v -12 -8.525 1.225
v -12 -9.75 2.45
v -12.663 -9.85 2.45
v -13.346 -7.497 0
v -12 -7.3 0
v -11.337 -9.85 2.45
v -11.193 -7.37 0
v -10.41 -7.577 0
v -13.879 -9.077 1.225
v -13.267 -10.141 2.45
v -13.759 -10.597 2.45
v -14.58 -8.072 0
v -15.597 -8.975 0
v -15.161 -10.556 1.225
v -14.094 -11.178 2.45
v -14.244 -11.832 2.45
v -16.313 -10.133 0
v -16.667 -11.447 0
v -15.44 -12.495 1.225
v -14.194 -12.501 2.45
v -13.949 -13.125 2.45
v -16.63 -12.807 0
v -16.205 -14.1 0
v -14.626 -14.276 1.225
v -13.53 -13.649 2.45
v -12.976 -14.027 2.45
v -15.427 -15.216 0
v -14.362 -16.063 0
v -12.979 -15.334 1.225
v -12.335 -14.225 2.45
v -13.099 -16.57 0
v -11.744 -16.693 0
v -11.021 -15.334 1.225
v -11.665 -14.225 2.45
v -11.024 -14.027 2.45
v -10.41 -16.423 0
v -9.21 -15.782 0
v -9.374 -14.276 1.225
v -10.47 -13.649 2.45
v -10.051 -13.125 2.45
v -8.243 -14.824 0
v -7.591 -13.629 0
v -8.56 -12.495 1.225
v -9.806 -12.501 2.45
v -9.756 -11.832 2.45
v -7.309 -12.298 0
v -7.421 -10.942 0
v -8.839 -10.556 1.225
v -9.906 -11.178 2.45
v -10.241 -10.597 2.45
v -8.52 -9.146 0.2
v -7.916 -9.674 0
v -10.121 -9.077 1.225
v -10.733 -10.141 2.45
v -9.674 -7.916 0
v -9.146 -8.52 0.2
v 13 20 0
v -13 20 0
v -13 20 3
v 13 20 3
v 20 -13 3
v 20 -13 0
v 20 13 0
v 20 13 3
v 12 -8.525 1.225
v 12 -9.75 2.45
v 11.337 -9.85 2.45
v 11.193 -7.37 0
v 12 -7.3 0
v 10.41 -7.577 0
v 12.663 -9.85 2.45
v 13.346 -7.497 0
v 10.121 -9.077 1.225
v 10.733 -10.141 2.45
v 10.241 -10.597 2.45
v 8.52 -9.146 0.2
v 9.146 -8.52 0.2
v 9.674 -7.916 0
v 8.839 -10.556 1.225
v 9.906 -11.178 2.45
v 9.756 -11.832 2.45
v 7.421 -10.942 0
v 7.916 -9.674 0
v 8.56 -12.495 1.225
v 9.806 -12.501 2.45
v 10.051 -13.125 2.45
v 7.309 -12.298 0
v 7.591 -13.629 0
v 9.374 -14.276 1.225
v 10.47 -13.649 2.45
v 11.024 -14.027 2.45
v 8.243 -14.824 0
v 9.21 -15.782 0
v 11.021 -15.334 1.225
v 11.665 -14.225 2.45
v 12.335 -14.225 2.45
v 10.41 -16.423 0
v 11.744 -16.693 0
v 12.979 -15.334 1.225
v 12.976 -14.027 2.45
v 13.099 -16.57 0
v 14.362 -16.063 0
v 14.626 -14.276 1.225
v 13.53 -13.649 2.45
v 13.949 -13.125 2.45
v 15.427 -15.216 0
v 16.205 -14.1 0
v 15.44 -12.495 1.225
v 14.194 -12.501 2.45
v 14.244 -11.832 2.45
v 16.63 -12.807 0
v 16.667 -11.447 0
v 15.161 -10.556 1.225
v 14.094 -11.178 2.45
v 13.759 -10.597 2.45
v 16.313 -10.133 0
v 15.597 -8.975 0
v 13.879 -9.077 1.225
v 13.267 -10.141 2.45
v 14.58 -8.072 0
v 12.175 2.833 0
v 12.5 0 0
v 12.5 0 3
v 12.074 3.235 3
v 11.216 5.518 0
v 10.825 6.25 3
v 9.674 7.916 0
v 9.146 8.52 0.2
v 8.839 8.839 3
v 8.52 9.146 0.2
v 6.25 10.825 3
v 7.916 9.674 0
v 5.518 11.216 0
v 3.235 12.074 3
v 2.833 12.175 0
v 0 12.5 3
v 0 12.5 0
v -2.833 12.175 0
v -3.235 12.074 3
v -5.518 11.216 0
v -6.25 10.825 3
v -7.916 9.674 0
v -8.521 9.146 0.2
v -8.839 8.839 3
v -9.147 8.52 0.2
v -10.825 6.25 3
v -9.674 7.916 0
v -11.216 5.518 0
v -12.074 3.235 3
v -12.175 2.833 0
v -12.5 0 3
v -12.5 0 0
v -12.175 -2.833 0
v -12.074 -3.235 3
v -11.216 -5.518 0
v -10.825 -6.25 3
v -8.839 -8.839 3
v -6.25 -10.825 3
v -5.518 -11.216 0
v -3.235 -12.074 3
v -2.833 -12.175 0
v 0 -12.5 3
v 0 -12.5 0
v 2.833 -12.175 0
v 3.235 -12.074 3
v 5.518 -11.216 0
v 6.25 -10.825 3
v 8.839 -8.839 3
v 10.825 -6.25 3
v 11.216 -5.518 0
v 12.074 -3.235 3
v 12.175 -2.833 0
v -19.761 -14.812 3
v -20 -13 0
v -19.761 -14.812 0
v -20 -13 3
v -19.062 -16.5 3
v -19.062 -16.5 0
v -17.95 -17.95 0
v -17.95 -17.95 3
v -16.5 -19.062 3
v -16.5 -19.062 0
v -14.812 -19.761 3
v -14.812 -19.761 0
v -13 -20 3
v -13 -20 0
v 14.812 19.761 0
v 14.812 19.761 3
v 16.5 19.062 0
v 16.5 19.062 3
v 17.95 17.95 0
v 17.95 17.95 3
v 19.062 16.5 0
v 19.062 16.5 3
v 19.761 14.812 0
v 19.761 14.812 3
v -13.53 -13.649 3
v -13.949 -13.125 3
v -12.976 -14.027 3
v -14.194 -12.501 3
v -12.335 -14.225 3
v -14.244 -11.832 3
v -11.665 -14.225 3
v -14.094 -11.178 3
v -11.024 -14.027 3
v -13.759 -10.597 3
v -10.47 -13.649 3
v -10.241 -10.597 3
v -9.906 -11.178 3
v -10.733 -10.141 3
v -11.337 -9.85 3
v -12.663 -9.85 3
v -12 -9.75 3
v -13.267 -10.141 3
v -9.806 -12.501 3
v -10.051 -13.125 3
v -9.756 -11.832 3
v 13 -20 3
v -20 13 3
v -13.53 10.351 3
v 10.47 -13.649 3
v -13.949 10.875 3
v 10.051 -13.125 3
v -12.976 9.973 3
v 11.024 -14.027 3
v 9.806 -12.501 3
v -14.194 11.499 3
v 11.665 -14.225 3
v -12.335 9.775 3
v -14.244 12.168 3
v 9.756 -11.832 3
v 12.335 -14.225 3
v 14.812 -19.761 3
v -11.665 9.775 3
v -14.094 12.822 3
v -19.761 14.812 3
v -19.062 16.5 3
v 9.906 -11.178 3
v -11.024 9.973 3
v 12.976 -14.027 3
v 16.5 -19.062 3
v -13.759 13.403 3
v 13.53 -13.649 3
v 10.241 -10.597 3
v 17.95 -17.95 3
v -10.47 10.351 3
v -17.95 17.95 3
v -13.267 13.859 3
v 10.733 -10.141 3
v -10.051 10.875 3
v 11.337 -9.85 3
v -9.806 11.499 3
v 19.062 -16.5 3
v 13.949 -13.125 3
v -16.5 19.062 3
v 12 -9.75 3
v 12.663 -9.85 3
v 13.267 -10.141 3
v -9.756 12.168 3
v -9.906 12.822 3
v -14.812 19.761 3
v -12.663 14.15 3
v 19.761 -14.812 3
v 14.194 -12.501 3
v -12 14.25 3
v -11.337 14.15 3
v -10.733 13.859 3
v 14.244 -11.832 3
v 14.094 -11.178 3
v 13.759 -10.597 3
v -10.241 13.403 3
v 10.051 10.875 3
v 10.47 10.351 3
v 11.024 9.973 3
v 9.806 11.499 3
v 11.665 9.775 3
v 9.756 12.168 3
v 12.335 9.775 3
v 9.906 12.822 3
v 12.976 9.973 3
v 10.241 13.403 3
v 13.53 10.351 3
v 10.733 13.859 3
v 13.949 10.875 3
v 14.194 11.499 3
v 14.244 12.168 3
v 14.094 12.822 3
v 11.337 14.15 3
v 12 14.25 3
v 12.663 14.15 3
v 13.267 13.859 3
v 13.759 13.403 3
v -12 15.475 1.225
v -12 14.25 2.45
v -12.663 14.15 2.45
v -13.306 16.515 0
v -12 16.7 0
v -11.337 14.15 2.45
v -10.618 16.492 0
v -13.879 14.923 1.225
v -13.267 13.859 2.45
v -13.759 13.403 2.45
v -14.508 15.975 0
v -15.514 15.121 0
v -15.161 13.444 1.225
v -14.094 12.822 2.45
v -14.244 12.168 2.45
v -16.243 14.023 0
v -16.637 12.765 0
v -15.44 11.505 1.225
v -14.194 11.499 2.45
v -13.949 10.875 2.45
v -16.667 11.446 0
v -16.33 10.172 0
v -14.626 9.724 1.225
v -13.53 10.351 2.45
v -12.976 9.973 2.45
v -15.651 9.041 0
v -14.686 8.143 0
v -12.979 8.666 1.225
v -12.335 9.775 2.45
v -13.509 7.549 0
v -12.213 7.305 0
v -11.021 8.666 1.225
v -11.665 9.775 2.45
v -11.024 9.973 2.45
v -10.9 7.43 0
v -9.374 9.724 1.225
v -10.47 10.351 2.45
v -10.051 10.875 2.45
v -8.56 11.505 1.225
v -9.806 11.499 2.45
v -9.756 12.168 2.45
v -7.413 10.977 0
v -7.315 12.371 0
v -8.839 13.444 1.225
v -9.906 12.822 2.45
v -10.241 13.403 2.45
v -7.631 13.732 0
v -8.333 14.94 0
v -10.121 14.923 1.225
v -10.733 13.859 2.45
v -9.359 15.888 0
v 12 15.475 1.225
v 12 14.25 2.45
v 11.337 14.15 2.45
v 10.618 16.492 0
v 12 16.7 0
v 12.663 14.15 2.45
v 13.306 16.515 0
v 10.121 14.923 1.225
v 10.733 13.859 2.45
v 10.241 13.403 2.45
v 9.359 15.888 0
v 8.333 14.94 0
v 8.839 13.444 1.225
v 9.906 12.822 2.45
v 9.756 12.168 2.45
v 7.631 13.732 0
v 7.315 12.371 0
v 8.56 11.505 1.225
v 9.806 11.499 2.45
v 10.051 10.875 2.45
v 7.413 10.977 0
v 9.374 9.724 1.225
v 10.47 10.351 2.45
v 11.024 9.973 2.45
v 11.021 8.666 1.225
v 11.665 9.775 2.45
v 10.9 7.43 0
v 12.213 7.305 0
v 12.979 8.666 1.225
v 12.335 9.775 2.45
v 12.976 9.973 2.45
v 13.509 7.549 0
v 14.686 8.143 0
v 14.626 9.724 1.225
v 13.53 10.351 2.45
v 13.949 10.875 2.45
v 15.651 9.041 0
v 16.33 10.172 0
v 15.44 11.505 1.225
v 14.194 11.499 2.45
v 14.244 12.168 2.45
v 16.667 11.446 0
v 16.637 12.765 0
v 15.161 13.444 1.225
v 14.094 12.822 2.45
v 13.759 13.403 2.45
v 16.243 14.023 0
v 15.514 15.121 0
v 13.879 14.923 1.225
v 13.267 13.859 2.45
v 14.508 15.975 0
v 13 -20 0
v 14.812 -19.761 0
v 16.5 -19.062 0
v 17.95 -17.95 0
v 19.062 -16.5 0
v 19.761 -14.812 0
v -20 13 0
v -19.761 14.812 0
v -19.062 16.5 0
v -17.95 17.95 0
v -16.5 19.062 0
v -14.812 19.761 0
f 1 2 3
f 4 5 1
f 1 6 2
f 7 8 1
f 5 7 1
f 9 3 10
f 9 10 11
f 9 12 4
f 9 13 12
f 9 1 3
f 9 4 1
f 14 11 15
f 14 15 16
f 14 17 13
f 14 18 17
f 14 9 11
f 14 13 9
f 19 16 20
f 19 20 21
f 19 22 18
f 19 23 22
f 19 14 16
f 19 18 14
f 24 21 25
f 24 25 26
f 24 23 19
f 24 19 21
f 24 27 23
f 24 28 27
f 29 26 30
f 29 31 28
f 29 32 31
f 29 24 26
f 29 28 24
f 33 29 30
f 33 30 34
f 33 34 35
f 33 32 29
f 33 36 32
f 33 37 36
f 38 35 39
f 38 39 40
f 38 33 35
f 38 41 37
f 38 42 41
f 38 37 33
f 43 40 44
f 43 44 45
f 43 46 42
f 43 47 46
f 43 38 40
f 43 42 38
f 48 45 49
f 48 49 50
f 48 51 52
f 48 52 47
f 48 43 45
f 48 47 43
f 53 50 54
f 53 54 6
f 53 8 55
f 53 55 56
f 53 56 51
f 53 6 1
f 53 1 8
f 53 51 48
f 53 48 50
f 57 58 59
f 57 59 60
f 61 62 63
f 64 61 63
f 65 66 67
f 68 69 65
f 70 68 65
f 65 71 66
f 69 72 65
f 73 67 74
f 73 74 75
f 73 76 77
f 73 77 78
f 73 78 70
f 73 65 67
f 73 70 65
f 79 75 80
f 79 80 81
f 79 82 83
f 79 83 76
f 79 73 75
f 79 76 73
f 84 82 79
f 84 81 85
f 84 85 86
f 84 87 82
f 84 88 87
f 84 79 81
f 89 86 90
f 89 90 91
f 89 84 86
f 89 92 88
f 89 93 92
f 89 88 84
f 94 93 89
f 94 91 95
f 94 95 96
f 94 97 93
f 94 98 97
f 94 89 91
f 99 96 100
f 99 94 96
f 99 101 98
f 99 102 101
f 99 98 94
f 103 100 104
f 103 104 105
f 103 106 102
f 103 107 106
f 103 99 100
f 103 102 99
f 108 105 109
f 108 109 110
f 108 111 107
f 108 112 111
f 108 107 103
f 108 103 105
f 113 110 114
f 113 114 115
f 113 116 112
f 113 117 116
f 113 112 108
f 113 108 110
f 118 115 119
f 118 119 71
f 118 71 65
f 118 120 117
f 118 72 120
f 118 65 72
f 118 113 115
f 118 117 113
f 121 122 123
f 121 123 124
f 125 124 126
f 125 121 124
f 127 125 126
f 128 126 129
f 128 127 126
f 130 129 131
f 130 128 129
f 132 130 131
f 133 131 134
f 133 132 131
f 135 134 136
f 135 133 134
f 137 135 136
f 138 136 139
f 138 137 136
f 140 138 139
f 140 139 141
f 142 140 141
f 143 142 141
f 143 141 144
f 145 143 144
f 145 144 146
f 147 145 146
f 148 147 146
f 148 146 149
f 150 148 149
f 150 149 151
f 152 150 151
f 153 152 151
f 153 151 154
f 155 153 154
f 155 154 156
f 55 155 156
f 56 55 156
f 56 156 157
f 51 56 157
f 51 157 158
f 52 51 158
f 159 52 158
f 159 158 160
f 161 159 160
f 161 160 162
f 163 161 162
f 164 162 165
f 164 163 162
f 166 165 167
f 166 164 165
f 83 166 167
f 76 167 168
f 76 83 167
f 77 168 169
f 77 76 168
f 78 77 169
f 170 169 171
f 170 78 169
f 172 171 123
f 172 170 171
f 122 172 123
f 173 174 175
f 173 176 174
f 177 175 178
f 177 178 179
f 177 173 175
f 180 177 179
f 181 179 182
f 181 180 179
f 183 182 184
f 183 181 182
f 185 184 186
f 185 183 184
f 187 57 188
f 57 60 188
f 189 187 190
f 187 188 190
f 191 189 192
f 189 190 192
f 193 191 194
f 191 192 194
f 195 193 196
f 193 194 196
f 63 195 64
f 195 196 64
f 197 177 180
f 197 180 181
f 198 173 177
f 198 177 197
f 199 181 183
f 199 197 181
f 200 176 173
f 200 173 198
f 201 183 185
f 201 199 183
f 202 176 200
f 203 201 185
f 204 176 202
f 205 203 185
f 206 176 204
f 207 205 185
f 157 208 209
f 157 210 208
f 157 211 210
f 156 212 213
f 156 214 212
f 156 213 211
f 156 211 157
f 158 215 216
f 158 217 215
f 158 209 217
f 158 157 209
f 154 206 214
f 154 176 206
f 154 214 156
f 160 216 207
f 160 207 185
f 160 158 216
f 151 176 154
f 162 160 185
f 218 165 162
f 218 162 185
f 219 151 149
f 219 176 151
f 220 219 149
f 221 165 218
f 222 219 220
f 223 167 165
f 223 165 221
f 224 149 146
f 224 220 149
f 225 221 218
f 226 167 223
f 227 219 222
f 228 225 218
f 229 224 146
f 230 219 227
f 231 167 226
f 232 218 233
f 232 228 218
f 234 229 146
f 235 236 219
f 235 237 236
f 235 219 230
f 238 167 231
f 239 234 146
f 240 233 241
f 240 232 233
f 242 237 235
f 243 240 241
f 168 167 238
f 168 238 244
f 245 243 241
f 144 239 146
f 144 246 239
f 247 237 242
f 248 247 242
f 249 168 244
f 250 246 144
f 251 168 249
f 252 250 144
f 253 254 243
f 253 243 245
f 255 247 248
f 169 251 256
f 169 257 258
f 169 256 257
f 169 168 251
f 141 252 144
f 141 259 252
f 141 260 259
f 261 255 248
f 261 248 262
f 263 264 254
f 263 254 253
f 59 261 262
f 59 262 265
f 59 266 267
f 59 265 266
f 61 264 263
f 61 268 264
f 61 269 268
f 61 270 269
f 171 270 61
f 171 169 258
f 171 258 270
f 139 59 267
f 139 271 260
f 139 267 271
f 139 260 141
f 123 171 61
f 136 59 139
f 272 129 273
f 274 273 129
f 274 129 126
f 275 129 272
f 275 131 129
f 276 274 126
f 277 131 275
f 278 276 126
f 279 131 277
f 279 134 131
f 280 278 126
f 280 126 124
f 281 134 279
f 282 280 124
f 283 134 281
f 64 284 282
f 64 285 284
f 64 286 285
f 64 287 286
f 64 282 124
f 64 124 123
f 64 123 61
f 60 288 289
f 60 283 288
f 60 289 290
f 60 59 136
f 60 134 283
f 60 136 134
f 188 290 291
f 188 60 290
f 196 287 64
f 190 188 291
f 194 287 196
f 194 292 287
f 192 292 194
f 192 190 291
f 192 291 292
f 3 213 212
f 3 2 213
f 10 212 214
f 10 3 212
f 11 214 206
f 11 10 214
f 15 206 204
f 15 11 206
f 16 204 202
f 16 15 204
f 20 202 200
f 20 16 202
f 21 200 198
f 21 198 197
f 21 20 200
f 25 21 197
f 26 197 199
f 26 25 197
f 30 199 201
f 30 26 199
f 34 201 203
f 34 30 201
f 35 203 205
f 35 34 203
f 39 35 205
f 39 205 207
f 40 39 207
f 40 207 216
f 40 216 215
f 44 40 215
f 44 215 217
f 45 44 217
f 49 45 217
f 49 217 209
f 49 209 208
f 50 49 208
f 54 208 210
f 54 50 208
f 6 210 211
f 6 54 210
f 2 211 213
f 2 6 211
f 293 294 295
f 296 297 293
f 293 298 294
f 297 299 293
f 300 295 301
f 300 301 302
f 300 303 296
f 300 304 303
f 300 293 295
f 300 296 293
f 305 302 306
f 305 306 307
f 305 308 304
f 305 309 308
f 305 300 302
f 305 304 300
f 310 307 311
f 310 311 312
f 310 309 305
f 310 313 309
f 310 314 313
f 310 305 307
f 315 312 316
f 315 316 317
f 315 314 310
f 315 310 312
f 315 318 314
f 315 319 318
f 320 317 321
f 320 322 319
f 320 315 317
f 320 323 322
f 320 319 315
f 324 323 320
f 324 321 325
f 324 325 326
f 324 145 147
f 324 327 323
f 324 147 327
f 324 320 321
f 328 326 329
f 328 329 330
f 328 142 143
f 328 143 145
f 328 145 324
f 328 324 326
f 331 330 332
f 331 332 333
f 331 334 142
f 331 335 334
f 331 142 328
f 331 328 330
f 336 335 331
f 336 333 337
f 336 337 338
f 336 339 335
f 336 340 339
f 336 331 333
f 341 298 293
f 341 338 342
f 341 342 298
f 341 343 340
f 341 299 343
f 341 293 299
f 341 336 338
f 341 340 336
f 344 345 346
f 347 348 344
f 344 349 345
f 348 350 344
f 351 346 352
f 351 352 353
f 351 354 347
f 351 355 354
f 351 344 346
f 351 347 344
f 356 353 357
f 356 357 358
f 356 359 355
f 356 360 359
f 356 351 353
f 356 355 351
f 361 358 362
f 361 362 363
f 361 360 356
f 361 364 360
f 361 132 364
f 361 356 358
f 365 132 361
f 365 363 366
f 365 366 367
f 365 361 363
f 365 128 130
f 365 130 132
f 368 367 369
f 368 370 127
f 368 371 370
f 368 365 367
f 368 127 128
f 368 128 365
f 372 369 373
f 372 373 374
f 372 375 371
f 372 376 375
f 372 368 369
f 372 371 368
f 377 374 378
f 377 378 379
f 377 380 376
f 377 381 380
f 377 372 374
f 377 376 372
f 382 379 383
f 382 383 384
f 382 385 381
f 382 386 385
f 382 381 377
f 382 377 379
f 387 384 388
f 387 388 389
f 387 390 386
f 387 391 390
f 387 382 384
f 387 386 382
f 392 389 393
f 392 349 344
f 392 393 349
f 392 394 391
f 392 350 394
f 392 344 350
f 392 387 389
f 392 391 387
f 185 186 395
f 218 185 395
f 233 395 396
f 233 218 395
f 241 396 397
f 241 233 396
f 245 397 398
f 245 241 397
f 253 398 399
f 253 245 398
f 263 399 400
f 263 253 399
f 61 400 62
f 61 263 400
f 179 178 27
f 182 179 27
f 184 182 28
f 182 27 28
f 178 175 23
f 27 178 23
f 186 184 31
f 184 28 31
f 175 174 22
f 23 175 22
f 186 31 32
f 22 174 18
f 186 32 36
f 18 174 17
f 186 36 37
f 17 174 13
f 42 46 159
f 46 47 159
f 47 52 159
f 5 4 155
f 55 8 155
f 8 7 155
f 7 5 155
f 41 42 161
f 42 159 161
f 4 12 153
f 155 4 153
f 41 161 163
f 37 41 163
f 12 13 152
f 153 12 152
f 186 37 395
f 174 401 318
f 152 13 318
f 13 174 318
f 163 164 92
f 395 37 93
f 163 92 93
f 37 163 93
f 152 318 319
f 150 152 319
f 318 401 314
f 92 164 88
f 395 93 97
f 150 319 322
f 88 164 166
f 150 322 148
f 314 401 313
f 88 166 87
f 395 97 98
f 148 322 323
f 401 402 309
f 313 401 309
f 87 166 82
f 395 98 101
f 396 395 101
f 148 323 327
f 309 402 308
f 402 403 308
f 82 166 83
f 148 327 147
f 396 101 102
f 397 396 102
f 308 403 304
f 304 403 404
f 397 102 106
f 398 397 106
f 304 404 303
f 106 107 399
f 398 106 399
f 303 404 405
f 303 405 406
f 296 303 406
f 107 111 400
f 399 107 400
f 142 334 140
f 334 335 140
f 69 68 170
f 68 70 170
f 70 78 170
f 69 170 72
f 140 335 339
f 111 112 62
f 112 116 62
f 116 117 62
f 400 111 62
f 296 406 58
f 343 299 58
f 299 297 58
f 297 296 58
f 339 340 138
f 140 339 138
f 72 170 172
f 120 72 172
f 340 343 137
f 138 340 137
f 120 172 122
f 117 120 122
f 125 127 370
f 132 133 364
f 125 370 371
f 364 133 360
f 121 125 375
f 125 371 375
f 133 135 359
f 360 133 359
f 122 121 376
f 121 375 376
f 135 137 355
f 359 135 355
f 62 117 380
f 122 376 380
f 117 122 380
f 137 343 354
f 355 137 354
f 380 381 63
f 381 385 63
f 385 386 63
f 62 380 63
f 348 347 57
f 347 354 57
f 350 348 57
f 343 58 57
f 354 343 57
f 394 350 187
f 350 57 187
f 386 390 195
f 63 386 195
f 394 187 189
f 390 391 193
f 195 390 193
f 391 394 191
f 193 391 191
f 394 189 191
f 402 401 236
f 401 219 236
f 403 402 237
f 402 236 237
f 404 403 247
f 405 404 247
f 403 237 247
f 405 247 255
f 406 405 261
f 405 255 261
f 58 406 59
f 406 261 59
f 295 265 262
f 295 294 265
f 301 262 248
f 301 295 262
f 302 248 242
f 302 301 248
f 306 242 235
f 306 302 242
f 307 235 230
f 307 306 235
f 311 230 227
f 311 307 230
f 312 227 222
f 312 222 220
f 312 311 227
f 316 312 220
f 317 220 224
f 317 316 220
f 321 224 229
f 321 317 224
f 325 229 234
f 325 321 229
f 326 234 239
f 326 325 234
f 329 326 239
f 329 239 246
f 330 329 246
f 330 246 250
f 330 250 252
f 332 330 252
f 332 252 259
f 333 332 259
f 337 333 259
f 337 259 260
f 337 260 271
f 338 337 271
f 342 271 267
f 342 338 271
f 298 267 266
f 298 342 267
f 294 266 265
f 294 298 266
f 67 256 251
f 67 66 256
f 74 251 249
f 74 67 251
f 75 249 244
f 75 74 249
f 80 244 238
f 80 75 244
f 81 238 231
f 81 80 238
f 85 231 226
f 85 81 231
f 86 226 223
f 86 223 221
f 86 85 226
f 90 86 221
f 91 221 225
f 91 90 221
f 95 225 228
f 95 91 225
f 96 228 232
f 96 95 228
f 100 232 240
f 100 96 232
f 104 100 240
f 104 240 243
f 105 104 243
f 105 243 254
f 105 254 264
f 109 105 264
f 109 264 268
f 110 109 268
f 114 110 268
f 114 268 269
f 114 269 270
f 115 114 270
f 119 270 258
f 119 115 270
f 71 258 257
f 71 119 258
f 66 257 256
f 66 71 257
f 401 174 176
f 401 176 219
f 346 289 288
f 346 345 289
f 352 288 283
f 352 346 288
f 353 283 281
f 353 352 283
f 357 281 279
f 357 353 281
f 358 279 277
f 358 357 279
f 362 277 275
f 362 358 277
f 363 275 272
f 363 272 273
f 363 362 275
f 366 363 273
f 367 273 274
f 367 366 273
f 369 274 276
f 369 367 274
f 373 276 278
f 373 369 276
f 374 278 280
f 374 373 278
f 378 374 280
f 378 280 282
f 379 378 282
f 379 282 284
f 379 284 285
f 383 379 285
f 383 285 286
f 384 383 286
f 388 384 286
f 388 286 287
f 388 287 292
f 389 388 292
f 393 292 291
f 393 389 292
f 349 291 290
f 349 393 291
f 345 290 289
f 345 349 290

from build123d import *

# Parameters (mm, degrees)
SKETCH1_W                                    = 40
SKETCH1_H                                    = 40
SKETCH1_R                                    = 12.5
BOSS_EXTRUDE1_DEPTH                          = 3
FILLET1_R                                    = 7
CSK_FOR_M4_COUNTERSUNK_FLAT_HEAD_SCR_2_COUNT = 2
CSK_FOR_M4_COUNTERSUNK_FLAT_HEAD_SCR_2_PITCH = 24
CSK_FOR_M4_COUNTERSUNK_FLAT_HEAD_SCR_3_COUNT = 2
CSK_FOR_M4_COUNTERSUNK_FLAT_HEAD_SCR_3_PITCH = 33.941125497
CSK_FOR_M4_COUNTERSUNK_FLAT_HEAD_SCR_4_COUNT = 2
CSK_FOR_M4_COUNTERSUNK_FLAT_HEAD_SCR_4_PITCH = 24


with BuildPart() as part:
    # Sketch1 → Boss-Extrude1 (new body)
    with BuildSketch(Plane.XY):
        Rectangle(SKETCH1_W, SKETCH1_H)
        Circle(SKETCH1_R, mode=Mode.SUBTRACT)
    extrude(amount=BOSS_EXTRUDE1_DEPTH)

    # Fillet1
    fillet1_edges = [part.edges().sort_by_distance(p)[0] for p in [
        (-20, -20, 1.5),
        (-20, 20, 1.5),
        (20, 20, 1.5),
        (20, -20, 1.5),
    ]]
    fillet(fillet1_edges, radius=FILLET1_R)

    # Sketch3 → CSK for M4 Countersunk Flat Head Screw1 (revolve, cut)
    with BuildSketch(Plane(origin=(12, 12, 0), x_dir=(0, 1, 0), z_dir=(1, 0, 0))):
        Polygon((0, 0), (0, 3), (2.25, 3), (2.25, 2.45), (4.7, 0), align=None)
    csk_for_m4_countersunk_flat_head_screw1 = revolve(axis=Axis((12, 12, -6.35), (0, 0, 1)), mode=Mode.SUBTRACT)

    # CSK for M4 Countersunk Flat Head Scr 2: CSK for M4 Countersunk Flat Head Screw1 ×2
    with Locations(*[(-i * CSK_FOR_M4_COUNTERSUNK_FLAT_HEAD_SCR_2_PITCH, 0, 0) for i in range(1, CSK_FOR_M4_COUNTERSUNK_FLAT_HEAD_SCR_2_COUNT)]):
        add(csk_for_m4_countersunk_flat_head_screw1, mode=Mode.SUBTRACT)

    # CSK for M4 Countersunk Flat Head Scr 3: CSK for M4 Countersunk Flat Head Screw1 ×2
    with Locations(*[Vector(-0.7071067811865475, -0.7071067811865476, 0) * (i * CSK_FOR_M4_COUNTERSUNK_FLAT_HEAD_SCR_3_PITCH) for i in range(1, CSK_FOR_M4_COUNTERSUNK_FLAT_HEAD_SCR_3_COUNT)]):
        add(csk_for_m4_countersunk_flat_head_screw1, mode=Mode.SUBTRACT)

    # CSK for M4 Countersunk Flat Head Scr 4: CSK for M4 Countersunk Flat Head Screw1 ×2
    with Locations(*[(0, -i * CSK_FOR_M4_COUNTERSUNK_FLAT_HEAD_SCR_4_PITCH, 0) for i in range(1, CSK_FOR_M4_COUNTERSUNK_FLAT_HEAD_SCR_4_COUNT)]):
        add(csk_for_m4_countersunk_flat_head_screw1, mode=Mode.SUBTRACT)


solid = part.part
